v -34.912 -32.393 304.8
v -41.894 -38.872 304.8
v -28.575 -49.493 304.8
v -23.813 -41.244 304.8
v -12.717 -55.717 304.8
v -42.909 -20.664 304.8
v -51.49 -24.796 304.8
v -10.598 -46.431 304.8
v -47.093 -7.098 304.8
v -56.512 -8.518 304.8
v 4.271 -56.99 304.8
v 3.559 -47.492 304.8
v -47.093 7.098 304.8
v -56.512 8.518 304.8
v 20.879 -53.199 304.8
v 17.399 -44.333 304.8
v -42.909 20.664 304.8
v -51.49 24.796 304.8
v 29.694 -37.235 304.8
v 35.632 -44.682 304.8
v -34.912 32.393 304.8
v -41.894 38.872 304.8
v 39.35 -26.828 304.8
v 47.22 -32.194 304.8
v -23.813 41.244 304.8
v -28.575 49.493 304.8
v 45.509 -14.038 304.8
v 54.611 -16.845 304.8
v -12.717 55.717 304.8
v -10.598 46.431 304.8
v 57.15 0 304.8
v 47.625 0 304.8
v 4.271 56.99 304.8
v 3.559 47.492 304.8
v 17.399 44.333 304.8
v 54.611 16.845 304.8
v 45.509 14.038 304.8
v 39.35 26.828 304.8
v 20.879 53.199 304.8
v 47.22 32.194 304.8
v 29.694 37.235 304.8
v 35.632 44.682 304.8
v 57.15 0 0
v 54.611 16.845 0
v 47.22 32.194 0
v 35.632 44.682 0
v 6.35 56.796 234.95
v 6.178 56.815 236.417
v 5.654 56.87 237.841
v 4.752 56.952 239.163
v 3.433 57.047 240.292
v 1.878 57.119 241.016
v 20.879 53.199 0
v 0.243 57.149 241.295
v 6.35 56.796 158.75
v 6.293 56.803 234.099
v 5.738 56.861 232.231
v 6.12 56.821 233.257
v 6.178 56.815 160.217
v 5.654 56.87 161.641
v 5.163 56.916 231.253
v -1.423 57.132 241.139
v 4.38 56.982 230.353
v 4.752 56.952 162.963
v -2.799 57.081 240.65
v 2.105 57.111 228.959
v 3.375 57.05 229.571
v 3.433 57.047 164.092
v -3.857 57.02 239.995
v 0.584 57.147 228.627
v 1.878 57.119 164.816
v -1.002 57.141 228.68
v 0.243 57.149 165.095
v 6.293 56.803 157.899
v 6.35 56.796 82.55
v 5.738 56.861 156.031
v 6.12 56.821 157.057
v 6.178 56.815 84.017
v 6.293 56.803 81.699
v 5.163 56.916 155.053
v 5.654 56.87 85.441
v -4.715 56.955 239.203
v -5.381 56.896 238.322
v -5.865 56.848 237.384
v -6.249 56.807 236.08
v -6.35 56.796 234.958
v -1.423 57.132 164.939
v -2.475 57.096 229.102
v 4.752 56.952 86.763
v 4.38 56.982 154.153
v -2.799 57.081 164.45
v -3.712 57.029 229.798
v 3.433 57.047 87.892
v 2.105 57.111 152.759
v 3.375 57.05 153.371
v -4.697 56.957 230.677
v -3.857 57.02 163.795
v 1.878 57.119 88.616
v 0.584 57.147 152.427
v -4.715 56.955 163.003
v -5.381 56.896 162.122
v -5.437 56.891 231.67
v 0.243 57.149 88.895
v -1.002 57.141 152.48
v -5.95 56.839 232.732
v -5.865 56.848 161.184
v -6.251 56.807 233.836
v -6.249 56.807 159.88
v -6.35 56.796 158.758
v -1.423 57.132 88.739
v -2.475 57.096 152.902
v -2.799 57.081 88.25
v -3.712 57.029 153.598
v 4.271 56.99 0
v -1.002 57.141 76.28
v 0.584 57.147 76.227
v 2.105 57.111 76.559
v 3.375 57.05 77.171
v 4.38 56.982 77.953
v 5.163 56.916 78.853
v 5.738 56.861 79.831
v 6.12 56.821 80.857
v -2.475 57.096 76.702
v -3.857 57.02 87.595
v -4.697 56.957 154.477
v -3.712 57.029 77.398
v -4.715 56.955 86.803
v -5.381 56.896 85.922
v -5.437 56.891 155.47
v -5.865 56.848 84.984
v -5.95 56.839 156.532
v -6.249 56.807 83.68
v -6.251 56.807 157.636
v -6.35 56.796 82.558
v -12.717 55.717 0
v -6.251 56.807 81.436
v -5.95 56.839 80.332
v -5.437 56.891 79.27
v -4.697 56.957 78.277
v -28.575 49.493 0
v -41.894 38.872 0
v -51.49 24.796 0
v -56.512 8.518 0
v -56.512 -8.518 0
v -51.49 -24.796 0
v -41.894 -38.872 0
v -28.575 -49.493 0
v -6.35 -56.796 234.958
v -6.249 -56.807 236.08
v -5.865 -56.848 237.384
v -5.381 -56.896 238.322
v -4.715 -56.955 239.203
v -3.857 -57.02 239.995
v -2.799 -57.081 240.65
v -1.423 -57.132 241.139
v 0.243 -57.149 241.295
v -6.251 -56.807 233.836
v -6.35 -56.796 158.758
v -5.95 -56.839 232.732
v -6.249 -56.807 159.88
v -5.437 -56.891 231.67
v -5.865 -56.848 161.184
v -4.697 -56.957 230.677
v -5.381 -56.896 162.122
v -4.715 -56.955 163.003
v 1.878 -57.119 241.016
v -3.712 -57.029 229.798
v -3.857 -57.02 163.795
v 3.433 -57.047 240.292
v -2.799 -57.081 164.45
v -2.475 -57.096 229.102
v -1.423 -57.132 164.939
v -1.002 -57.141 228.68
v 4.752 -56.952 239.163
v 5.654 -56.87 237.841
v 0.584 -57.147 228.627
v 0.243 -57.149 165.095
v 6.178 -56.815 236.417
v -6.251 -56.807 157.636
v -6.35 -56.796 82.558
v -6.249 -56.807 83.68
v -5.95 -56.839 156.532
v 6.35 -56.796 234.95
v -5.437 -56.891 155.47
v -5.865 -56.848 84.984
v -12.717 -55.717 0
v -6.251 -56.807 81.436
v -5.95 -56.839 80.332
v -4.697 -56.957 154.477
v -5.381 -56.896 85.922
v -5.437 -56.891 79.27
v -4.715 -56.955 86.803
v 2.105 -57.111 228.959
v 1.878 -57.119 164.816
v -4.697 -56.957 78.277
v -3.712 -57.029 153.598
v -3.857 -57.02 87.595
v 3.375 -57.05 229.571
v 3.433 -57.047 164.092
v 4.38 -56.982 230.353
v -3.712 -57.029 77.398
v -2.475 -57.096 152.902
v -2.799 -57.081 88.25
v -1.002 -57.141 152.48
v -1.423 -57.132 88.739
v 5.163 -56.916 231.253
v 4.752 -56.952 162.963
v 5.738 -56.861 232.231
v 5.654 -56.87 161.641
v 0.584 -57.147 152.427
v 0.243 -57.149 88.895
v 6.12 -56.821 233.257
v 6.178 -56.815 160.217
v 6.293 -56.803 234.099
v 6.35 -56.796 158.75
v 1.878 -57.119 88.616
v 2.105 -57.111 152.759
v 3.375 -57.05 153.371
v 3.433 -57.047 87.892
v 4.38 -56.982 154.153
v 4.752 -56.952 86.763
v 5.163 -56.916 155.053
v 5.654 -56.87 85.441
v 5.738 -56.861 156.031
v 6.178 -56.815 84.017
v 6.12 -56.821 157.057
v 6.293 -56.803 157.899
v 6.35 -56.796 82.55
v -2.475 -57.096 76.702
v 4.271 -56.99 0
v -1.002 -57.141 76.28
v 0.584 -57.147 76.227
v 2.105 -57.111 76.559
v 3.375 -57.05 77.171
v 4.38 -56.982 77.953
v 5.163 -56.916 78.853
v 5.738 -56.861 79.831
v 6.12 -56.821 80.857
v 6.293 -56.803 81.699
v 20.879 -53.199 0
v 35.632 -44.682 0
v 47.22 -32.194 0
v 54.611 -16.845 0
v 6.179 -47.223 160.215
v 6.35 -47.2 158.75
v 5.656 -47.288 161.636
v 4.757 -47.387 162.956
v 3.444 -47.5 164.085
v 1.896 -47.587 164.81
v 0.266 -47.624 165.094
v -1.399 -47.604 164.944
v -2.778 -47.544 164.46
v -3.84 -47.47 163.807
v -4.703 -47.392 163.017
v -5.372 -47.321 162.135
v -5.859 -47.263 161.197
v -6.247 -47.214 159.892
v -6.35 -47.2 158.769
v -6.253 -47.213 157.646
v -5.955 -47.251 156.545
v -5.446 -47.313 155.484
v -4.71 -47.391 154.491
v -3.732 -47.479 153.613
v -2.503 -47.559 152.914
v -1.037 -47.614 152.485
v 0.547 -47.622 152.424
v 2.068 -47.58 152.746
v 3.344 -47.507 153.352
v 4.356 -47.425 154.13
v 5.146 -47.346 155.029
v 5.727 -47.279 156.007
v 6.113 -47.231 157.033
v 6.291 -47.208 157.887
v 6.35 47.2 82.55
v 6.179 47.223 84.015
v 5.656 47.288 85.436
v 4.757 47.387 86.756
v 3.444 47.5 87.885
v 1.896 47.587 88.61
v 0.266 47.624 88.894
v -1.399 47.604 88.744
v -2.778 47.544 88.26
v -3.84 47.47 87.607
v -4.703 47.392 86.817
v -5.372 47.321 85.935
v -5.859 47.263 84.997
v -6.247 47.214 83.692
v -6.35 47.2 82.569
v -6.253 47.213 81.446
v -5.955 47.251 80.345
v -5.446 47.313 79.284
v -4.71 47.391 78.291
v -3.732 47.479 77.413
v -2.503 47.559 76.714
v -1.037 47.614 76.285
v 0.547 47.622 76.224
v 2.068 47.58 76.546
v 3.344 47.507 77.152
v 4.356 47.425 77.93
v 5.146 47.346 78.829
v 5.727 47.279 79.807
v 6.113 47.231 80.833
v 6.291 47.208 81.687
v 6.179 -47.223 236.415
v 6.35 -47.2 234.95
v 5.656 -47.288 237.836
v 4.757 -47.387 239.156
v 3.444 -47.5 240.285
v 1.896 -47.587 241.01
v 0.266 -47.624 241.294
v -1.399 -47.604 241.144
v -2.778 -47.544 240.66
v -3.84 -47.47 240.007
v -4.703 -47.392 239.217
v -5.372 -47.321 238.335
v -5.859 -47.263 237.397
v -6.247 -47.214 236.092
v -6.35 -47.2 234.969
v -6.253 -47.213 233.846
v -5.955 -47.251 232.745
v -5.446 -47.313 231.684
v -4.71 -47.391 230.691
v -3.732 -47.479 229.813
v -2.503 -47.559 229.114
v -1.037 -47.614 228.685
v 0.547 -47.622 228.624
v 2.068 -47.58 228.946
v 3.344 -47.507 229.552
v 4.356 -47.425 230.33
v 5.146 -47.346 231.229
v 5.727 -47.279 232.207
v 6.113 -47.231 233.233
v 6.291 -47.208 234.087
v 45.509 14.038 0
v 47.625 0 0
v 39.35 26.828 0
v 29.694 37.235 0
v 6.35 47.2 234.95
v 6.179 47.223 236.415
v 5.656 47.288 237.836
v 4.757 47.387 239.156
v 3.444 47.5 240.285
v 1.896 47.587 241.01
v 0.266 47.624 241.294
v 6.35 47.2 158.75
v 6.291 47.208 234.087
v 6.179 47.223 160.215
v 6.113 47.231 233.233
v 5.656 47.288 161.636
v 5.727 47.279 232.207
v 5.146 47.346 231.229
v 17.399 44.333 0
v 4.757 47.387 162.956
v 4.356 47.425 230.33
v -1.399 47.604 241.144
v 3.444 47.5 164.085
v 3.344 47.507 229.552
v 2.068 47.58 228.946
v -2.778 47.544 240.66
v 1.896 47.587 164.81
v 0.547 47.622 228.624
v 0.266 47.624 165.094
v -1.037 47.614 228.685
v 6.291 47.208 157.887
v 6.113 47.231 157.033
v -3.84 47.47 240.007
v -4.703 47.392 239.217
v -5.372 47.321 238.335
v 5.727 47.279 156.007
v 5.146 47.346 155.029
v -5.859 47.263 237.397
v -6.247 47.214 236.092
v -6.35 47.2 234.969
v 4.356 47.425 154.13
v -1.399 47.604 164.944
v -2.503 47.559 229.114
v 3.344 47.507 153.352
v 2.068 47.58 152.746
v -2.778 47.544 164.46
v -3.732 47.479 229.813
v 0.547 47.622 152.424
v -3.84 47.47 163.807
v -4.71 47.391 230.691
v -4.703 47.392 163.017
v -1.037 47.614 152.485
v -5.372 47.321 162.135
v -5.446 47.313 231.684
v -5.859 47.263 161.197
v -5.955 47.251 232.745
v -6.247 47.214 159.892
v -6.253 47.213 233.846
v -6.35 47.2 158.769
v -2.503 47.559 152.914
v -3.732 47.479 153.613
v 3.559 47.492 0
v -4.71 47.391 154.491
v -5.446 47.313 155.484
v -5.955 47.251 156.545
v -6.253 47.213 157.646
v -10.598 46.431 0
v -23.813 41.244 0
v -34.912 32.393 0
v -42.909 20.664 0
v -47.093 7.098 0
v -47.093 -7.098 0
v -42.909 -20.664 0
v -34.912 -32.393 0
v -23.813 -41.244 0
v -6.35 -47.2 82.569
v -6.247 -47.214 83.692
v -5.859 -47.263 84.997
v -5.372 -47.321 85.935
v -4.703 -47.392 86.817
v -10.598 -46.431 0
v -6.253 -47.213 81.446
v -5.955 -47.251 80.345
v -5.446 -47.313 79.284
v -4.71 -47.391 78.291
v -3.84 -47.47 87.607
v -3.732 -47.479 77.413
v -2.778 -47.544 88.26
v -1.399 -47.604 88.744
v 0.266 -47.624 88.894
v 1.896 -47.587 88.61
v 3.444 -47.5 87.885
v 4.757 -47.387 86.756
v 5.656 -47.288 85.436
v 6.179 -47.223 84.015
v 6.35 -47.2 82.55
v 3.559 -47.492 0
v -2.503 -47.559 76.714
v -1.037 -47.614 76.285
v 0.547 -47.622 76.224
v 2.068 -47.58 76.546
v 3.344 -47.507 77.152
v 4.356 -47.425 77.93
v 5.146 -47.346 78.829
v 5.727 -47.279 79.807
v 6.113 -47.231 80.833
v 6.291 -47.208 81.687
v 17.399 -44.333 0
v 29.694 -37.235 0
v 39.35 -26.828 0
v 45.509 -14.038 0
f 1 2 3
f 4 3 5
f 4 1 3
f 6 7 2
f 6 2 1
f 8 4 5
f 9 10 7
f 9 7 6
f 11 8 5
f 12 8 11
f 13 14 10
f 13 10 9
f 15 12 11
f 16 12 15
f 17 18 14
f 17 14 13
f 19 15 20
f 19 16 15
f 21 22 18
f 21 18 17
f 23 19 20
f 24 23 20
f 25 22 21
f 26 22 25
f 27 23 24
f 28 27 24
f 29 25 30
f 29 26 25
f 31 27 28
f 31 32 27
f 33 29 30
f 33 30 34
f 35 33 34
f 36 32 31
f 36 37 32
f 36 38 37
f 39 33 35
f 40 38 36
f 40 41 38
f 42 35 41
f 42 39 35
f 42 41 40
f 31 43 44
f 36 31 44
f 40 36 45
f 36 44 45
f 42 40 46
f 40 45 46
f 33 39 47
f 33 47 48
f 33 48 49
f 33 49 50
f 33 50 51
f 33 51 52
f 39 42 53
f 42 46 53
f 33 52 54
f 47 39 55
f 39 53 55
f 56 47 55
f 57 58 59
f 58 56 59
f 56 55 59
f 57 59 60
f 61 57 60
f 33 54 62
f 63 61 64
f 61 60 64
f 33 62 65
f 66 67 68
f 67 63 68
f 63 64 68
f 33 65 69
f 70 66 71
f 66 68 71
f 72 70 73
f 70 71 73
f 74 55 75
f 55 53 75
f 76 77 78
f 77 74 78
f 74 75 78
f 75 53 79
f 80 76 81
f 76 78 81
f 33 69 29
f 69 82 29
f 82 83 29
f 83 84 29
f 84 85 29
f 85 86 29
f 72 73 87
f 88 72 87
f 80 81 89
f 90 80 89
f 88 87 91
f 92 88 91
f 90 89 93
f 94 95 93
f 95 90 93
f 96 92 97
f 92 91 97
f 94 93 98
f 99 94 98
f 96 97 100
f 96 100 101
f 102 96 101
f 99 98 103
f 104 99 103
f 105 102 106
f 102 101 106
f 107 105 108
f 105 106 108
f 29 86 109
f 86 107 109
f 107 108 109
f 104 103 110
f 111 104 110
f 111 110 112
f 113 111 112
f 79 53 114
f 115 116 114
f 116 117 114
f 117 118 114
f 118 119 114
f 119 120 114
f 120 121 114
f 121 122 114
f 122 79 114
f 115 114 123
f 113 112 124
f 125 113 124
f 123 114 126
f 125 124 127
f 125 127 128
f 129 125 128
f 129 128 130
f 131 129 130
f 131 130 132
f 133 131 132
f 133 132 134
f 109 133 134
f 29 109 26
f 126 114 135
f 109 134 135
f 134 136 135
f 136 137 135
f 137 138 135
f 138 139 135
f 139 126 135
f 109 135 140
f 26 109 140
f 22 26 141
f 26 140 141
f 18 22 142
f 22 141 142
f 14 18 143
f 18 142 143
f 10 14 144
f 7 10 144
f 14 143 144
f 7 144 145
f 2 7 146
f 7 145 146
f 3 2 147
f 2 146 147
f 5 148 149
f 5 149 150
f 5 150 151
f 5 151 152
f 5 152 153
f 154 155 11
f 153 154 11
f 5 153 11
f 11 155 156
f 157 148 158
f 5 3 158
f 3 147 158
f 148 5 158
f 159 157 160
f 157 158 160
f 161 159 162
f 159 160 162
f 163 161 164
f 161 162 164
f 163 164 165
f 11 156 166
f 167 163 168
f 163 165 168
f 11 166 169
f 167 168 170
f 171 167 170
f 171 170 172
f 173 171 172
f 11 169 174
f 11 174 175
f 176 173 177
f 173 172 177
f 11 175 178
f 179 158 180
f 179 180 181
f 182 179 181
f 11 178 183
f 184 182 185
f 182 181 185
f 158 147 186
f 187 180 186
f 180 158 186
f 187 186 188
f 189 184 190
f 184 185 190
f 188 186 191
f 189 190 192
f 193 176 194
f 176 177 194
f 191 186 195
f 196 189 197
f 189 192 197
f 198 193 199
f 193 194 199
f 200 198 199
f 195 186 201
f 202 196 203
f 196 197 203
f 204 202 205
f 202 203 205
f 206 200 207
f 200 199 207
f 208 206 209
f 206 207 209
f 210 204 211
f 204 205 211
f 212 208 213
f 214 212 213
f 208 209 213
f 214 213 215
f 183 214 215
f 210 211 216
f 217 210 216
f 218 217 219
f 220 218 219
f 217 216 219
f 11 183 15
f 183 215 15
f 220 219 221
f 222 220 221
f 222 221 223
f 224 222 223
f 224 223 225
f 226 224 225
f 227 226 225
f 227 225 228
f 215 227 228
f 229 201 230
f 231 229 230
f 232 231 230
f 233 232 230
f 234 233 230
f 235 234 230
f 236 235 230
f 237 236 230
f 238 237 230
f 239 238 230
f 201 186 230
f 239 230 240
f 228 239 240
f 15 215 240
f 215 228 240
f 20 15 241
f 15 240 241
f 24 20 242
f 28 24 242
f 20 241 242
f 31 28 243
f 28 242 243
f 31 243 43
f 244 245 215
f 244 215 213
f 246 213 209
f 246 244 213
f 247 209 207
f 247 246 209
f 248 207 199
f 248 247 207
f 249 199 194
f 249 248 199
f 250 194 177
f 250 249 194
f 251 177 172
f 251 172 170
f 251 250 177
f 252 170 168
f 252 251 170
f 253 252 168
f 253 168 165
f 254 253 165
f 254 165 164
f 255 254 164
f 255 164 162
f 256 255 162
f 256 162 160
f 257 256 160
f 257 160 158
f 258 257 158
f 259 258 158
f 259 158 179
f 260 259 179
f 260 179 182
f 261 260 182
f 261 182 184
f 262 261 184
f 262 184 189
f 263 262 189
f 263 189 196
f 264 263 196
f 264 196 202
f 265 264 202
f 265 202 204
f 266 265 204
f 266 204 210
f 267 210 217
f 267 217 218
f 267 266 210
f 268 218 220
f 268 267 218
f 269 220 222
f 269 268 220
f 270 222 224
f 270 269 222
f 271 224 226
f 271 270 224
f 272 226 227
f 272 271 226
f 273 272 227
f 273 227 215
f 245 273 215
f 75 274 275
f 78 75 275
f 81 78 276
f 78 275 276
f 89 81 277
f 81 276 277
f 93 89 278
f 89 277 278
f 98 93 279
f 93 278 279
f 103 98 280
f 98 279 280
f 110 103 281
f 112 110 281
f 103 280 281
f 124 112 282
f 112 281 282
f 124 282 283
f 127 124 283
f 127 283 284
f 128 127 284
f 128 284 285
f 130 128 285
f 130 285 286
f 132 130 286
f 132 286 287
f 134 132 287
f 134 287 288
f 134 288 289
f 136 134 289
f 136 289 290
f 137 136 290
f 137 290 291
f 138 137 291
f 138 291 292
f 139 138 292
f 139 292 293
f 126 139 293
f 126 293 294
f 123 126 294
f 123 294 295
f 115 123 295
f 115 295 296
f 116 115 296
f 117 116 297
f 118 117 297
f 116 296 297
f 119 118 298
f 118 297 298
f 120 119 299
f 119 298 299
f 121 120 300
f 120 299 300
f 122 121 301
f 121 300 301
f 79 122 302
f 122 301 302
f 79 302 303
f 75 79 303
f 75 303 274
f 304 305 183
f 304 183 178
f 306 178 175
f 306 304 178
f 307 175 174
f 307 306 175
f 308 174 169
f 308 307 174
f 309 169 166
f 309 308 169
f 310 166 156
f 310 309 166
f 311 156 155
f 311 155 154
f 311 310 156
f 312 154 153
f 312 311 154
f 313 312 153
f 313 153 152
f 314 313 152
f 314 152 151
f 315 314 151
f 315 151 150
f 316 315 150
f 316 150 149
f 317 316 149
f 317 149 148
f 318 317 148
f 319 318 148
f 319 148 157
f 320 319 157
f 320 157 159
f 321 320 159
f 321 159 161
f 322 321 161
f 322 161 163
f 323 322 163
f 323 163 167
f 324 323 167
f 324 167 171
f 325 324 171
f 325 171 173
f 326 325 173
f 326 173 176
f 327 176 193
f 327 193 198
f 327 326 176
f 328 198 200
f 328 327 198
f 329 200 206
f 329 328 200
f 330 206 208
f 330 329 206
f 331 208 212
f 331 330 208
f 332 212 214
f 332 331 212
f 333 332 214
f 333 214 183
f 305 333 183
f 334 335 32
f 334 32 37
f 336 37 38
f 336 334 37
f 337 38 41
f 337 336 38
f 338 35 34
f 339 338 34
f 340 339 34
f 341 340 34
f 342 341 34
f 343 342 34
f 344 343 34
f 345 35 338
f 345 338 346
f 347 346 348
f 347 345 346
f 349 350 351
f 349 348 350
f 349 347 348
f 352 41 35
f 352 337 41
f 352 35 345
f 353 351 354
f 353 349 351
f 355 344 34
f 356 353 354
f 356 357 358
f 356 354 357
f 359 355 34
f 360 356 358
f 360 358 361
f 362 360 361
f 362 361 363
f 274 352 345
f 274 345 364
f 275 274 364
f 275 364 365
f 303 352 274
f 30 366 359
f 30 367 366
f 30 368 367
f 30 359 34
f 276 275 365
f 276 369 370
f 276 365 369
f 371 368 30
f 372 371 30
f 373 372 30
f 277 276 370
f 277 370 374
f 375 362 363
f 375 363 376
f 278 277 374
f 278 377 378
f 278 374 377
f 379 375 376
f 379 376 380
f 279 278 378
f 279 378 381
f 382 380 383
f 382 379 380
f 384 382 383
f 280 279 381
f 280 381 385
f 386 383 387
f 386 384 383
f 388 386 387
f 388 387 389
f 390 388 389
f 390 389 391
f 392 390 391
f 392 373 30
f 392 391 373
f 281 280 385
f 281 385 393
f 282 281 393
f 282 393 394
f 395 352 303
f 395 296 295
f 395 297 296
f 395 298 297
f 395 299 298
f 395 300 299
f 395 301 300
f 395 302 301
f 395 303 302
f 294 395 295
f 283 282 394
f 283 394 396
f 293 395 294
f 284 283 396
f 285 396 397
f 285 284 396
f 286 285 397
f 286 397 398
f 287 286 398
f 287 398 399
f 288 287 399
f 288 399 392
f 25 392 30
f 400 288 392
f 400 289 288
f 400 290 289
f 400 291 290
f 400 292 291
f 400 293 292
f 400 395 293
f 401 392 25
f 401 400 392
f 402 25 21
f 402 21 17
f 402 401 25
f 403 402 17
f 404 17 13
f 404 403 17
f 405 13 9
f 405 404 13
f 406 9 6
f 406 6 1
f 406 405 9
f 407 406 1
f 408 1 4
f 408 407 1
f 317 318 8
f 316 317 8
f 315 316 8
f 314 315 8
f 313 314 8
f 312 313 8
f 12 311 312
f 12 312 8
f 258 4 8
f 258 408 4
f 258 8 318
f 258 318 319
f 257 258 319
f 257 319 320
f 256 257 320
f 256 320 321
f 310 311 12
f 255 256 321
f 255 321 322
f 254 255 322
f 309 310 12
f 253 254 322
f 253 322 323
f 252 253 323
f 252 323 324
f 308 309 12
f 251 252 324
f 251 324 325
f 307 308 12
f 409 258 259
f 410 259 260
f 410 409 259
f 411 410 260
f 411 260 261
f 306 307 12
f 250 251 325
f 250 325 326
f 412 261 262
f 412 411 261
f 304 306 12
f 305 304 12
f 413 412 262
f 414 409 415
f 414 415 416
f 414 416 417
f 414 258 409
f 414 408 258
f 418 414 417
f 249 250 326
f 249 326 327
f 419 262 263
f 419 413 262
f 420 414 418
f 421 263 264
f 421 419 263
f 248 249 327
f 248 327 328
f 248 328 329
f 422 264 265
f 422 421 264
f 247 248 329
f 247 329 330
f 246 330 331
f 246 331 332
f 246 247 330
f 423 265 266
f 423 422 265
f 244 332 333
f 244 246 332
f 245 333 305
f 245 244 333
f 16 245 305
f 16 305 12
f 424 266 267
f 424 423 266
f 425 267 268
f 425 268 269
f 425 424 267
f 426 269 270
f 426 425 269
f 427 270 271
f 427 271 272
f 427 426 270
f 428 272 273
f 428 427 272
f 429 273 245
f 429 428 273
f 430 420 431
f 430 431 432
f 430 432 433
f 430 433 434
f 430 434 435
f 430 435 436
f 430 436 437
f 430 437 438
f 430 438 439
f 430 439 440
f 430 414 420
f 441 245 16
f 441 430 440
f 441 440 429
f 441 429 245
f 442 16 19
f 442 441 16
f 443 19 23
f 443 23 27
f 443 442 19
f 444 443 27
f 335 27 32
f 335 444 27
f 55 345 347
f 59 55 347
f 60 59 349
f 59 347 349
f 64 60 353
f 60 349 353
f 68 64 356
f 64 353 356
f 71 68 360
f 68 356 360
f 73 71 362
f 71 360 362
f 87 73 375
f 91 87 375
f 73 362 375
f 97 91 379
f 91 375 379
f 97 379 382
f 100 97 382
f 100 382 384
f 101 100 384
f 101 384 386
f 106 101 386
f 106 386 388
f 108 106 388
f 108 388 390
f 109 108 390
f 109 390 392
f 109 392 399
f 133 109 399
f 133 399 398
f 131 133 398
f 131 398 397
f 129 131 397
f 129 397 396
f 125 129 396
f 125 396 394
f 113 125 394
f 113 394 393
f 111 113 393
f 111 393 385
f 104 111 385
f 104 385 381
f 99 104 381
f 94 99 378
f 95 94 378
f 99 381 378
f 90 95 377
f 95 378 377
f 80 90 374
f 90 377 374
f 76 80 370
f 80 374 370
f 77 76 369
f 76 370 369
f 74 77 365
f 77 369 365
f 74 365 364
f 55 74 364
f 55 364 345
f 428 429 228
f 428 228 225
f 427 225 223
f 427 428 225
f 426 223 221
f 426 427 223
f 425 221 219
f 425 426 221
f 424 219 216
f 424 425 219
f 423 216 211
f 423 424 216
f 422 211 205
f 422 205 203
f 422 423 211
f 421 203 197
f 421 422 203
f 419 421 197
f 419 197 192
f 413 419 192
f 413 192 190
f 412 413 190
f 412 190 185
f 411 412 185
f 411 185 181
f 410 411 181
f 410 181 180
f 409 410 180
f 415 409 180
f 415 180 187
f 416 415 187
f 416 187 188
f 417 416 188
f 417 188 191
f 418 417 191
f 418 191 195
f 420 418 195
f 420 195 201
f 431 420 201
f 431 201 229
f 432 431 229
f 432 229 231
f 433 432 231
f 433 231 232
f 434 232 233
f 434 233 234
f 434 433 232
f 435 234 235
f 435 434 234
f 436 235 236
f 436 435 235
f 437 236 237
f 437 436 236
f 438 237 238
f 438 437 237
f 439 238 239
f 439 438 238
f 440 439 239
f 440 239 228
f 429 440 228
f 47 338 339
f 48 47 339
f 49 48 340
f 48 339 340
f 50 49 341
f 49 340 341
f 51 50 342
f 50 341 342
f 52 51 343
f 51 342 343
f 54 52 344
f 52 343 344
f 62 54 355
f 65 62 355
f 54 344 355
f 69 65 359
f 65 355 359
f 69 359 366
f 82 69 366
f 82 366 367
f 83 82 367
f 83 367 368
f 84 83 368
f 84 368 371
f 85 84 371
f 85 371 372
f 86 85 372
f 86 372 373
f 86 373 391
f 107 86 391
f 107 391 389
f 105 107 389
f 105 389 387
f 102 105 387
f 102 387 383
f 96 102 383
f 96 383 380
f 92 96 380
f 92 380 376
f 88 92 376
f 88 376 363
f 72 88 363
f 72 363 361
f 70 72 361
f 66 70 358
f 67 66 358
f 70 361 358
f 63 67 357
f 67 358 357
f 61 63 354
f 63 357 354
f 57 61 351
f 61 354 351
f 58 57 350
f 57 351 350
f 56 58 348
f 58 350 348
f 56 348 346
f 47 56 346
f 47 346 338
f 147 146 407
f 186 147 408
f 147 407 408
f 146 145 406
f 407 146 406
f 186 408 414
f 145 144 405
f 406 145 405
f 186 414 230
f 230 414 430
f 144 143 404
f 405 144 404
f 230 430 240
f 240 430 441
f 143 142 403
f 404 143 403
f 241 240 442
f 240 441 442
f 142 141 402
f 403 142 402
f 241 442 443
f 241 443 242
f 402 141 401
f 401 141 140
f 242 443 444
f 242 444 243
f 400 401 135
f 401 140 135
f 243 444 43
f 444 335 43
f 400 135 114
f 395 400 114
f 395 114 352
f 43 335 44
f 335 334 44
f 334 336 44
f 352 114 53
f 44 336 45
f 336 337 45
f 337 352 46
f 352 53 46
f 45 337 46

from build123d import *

# Parameters (mm, degrees)
F0_R     = 57.15
F0_R_2   = 47.625
F1_DEPTH = 304.8
F2_R     = 6.35
F3_DEPTH = 57.151
F4_DEPTH = 57.151


with BuildPart() as f1:
    # F0 (on Top) → F1 (new body)
    with BuildSketch(Plane.XY):
        Circle(F0_R)
        Circle(F0_R_2, mode=Mode.SUBTRACT)
    extrude(amount=F1_DEPTH)

    # F2 (on Front) → F3 (cut, through all)
    with BuildSketch(Plane.XZ):
        with Locations((0, 82.55)):
            Circle(F2_R)
        with Locations((0, 158.75)):
            Circle(F2_R)
        with Locations((0, 234.95)):
            Circle(F2_R)
    extrude(amount=-F3_DEPTH, mode=Mode.SUBTRACT)

    # F2 (on Front) → F4 (cut, through all)
    with BuildSketch(Plane.XZ):
        with Locations((0, 82.55)):
            Circle(F2_R)
        with Locations((0, 158.75)):
            Circle(F2_R)
        with Locations((0, 234.95)):
            Circle(F2_R)
    extrude(amount=F4_DEPTH, mode=Mode.SUBTRACT)


solid = f1.part
